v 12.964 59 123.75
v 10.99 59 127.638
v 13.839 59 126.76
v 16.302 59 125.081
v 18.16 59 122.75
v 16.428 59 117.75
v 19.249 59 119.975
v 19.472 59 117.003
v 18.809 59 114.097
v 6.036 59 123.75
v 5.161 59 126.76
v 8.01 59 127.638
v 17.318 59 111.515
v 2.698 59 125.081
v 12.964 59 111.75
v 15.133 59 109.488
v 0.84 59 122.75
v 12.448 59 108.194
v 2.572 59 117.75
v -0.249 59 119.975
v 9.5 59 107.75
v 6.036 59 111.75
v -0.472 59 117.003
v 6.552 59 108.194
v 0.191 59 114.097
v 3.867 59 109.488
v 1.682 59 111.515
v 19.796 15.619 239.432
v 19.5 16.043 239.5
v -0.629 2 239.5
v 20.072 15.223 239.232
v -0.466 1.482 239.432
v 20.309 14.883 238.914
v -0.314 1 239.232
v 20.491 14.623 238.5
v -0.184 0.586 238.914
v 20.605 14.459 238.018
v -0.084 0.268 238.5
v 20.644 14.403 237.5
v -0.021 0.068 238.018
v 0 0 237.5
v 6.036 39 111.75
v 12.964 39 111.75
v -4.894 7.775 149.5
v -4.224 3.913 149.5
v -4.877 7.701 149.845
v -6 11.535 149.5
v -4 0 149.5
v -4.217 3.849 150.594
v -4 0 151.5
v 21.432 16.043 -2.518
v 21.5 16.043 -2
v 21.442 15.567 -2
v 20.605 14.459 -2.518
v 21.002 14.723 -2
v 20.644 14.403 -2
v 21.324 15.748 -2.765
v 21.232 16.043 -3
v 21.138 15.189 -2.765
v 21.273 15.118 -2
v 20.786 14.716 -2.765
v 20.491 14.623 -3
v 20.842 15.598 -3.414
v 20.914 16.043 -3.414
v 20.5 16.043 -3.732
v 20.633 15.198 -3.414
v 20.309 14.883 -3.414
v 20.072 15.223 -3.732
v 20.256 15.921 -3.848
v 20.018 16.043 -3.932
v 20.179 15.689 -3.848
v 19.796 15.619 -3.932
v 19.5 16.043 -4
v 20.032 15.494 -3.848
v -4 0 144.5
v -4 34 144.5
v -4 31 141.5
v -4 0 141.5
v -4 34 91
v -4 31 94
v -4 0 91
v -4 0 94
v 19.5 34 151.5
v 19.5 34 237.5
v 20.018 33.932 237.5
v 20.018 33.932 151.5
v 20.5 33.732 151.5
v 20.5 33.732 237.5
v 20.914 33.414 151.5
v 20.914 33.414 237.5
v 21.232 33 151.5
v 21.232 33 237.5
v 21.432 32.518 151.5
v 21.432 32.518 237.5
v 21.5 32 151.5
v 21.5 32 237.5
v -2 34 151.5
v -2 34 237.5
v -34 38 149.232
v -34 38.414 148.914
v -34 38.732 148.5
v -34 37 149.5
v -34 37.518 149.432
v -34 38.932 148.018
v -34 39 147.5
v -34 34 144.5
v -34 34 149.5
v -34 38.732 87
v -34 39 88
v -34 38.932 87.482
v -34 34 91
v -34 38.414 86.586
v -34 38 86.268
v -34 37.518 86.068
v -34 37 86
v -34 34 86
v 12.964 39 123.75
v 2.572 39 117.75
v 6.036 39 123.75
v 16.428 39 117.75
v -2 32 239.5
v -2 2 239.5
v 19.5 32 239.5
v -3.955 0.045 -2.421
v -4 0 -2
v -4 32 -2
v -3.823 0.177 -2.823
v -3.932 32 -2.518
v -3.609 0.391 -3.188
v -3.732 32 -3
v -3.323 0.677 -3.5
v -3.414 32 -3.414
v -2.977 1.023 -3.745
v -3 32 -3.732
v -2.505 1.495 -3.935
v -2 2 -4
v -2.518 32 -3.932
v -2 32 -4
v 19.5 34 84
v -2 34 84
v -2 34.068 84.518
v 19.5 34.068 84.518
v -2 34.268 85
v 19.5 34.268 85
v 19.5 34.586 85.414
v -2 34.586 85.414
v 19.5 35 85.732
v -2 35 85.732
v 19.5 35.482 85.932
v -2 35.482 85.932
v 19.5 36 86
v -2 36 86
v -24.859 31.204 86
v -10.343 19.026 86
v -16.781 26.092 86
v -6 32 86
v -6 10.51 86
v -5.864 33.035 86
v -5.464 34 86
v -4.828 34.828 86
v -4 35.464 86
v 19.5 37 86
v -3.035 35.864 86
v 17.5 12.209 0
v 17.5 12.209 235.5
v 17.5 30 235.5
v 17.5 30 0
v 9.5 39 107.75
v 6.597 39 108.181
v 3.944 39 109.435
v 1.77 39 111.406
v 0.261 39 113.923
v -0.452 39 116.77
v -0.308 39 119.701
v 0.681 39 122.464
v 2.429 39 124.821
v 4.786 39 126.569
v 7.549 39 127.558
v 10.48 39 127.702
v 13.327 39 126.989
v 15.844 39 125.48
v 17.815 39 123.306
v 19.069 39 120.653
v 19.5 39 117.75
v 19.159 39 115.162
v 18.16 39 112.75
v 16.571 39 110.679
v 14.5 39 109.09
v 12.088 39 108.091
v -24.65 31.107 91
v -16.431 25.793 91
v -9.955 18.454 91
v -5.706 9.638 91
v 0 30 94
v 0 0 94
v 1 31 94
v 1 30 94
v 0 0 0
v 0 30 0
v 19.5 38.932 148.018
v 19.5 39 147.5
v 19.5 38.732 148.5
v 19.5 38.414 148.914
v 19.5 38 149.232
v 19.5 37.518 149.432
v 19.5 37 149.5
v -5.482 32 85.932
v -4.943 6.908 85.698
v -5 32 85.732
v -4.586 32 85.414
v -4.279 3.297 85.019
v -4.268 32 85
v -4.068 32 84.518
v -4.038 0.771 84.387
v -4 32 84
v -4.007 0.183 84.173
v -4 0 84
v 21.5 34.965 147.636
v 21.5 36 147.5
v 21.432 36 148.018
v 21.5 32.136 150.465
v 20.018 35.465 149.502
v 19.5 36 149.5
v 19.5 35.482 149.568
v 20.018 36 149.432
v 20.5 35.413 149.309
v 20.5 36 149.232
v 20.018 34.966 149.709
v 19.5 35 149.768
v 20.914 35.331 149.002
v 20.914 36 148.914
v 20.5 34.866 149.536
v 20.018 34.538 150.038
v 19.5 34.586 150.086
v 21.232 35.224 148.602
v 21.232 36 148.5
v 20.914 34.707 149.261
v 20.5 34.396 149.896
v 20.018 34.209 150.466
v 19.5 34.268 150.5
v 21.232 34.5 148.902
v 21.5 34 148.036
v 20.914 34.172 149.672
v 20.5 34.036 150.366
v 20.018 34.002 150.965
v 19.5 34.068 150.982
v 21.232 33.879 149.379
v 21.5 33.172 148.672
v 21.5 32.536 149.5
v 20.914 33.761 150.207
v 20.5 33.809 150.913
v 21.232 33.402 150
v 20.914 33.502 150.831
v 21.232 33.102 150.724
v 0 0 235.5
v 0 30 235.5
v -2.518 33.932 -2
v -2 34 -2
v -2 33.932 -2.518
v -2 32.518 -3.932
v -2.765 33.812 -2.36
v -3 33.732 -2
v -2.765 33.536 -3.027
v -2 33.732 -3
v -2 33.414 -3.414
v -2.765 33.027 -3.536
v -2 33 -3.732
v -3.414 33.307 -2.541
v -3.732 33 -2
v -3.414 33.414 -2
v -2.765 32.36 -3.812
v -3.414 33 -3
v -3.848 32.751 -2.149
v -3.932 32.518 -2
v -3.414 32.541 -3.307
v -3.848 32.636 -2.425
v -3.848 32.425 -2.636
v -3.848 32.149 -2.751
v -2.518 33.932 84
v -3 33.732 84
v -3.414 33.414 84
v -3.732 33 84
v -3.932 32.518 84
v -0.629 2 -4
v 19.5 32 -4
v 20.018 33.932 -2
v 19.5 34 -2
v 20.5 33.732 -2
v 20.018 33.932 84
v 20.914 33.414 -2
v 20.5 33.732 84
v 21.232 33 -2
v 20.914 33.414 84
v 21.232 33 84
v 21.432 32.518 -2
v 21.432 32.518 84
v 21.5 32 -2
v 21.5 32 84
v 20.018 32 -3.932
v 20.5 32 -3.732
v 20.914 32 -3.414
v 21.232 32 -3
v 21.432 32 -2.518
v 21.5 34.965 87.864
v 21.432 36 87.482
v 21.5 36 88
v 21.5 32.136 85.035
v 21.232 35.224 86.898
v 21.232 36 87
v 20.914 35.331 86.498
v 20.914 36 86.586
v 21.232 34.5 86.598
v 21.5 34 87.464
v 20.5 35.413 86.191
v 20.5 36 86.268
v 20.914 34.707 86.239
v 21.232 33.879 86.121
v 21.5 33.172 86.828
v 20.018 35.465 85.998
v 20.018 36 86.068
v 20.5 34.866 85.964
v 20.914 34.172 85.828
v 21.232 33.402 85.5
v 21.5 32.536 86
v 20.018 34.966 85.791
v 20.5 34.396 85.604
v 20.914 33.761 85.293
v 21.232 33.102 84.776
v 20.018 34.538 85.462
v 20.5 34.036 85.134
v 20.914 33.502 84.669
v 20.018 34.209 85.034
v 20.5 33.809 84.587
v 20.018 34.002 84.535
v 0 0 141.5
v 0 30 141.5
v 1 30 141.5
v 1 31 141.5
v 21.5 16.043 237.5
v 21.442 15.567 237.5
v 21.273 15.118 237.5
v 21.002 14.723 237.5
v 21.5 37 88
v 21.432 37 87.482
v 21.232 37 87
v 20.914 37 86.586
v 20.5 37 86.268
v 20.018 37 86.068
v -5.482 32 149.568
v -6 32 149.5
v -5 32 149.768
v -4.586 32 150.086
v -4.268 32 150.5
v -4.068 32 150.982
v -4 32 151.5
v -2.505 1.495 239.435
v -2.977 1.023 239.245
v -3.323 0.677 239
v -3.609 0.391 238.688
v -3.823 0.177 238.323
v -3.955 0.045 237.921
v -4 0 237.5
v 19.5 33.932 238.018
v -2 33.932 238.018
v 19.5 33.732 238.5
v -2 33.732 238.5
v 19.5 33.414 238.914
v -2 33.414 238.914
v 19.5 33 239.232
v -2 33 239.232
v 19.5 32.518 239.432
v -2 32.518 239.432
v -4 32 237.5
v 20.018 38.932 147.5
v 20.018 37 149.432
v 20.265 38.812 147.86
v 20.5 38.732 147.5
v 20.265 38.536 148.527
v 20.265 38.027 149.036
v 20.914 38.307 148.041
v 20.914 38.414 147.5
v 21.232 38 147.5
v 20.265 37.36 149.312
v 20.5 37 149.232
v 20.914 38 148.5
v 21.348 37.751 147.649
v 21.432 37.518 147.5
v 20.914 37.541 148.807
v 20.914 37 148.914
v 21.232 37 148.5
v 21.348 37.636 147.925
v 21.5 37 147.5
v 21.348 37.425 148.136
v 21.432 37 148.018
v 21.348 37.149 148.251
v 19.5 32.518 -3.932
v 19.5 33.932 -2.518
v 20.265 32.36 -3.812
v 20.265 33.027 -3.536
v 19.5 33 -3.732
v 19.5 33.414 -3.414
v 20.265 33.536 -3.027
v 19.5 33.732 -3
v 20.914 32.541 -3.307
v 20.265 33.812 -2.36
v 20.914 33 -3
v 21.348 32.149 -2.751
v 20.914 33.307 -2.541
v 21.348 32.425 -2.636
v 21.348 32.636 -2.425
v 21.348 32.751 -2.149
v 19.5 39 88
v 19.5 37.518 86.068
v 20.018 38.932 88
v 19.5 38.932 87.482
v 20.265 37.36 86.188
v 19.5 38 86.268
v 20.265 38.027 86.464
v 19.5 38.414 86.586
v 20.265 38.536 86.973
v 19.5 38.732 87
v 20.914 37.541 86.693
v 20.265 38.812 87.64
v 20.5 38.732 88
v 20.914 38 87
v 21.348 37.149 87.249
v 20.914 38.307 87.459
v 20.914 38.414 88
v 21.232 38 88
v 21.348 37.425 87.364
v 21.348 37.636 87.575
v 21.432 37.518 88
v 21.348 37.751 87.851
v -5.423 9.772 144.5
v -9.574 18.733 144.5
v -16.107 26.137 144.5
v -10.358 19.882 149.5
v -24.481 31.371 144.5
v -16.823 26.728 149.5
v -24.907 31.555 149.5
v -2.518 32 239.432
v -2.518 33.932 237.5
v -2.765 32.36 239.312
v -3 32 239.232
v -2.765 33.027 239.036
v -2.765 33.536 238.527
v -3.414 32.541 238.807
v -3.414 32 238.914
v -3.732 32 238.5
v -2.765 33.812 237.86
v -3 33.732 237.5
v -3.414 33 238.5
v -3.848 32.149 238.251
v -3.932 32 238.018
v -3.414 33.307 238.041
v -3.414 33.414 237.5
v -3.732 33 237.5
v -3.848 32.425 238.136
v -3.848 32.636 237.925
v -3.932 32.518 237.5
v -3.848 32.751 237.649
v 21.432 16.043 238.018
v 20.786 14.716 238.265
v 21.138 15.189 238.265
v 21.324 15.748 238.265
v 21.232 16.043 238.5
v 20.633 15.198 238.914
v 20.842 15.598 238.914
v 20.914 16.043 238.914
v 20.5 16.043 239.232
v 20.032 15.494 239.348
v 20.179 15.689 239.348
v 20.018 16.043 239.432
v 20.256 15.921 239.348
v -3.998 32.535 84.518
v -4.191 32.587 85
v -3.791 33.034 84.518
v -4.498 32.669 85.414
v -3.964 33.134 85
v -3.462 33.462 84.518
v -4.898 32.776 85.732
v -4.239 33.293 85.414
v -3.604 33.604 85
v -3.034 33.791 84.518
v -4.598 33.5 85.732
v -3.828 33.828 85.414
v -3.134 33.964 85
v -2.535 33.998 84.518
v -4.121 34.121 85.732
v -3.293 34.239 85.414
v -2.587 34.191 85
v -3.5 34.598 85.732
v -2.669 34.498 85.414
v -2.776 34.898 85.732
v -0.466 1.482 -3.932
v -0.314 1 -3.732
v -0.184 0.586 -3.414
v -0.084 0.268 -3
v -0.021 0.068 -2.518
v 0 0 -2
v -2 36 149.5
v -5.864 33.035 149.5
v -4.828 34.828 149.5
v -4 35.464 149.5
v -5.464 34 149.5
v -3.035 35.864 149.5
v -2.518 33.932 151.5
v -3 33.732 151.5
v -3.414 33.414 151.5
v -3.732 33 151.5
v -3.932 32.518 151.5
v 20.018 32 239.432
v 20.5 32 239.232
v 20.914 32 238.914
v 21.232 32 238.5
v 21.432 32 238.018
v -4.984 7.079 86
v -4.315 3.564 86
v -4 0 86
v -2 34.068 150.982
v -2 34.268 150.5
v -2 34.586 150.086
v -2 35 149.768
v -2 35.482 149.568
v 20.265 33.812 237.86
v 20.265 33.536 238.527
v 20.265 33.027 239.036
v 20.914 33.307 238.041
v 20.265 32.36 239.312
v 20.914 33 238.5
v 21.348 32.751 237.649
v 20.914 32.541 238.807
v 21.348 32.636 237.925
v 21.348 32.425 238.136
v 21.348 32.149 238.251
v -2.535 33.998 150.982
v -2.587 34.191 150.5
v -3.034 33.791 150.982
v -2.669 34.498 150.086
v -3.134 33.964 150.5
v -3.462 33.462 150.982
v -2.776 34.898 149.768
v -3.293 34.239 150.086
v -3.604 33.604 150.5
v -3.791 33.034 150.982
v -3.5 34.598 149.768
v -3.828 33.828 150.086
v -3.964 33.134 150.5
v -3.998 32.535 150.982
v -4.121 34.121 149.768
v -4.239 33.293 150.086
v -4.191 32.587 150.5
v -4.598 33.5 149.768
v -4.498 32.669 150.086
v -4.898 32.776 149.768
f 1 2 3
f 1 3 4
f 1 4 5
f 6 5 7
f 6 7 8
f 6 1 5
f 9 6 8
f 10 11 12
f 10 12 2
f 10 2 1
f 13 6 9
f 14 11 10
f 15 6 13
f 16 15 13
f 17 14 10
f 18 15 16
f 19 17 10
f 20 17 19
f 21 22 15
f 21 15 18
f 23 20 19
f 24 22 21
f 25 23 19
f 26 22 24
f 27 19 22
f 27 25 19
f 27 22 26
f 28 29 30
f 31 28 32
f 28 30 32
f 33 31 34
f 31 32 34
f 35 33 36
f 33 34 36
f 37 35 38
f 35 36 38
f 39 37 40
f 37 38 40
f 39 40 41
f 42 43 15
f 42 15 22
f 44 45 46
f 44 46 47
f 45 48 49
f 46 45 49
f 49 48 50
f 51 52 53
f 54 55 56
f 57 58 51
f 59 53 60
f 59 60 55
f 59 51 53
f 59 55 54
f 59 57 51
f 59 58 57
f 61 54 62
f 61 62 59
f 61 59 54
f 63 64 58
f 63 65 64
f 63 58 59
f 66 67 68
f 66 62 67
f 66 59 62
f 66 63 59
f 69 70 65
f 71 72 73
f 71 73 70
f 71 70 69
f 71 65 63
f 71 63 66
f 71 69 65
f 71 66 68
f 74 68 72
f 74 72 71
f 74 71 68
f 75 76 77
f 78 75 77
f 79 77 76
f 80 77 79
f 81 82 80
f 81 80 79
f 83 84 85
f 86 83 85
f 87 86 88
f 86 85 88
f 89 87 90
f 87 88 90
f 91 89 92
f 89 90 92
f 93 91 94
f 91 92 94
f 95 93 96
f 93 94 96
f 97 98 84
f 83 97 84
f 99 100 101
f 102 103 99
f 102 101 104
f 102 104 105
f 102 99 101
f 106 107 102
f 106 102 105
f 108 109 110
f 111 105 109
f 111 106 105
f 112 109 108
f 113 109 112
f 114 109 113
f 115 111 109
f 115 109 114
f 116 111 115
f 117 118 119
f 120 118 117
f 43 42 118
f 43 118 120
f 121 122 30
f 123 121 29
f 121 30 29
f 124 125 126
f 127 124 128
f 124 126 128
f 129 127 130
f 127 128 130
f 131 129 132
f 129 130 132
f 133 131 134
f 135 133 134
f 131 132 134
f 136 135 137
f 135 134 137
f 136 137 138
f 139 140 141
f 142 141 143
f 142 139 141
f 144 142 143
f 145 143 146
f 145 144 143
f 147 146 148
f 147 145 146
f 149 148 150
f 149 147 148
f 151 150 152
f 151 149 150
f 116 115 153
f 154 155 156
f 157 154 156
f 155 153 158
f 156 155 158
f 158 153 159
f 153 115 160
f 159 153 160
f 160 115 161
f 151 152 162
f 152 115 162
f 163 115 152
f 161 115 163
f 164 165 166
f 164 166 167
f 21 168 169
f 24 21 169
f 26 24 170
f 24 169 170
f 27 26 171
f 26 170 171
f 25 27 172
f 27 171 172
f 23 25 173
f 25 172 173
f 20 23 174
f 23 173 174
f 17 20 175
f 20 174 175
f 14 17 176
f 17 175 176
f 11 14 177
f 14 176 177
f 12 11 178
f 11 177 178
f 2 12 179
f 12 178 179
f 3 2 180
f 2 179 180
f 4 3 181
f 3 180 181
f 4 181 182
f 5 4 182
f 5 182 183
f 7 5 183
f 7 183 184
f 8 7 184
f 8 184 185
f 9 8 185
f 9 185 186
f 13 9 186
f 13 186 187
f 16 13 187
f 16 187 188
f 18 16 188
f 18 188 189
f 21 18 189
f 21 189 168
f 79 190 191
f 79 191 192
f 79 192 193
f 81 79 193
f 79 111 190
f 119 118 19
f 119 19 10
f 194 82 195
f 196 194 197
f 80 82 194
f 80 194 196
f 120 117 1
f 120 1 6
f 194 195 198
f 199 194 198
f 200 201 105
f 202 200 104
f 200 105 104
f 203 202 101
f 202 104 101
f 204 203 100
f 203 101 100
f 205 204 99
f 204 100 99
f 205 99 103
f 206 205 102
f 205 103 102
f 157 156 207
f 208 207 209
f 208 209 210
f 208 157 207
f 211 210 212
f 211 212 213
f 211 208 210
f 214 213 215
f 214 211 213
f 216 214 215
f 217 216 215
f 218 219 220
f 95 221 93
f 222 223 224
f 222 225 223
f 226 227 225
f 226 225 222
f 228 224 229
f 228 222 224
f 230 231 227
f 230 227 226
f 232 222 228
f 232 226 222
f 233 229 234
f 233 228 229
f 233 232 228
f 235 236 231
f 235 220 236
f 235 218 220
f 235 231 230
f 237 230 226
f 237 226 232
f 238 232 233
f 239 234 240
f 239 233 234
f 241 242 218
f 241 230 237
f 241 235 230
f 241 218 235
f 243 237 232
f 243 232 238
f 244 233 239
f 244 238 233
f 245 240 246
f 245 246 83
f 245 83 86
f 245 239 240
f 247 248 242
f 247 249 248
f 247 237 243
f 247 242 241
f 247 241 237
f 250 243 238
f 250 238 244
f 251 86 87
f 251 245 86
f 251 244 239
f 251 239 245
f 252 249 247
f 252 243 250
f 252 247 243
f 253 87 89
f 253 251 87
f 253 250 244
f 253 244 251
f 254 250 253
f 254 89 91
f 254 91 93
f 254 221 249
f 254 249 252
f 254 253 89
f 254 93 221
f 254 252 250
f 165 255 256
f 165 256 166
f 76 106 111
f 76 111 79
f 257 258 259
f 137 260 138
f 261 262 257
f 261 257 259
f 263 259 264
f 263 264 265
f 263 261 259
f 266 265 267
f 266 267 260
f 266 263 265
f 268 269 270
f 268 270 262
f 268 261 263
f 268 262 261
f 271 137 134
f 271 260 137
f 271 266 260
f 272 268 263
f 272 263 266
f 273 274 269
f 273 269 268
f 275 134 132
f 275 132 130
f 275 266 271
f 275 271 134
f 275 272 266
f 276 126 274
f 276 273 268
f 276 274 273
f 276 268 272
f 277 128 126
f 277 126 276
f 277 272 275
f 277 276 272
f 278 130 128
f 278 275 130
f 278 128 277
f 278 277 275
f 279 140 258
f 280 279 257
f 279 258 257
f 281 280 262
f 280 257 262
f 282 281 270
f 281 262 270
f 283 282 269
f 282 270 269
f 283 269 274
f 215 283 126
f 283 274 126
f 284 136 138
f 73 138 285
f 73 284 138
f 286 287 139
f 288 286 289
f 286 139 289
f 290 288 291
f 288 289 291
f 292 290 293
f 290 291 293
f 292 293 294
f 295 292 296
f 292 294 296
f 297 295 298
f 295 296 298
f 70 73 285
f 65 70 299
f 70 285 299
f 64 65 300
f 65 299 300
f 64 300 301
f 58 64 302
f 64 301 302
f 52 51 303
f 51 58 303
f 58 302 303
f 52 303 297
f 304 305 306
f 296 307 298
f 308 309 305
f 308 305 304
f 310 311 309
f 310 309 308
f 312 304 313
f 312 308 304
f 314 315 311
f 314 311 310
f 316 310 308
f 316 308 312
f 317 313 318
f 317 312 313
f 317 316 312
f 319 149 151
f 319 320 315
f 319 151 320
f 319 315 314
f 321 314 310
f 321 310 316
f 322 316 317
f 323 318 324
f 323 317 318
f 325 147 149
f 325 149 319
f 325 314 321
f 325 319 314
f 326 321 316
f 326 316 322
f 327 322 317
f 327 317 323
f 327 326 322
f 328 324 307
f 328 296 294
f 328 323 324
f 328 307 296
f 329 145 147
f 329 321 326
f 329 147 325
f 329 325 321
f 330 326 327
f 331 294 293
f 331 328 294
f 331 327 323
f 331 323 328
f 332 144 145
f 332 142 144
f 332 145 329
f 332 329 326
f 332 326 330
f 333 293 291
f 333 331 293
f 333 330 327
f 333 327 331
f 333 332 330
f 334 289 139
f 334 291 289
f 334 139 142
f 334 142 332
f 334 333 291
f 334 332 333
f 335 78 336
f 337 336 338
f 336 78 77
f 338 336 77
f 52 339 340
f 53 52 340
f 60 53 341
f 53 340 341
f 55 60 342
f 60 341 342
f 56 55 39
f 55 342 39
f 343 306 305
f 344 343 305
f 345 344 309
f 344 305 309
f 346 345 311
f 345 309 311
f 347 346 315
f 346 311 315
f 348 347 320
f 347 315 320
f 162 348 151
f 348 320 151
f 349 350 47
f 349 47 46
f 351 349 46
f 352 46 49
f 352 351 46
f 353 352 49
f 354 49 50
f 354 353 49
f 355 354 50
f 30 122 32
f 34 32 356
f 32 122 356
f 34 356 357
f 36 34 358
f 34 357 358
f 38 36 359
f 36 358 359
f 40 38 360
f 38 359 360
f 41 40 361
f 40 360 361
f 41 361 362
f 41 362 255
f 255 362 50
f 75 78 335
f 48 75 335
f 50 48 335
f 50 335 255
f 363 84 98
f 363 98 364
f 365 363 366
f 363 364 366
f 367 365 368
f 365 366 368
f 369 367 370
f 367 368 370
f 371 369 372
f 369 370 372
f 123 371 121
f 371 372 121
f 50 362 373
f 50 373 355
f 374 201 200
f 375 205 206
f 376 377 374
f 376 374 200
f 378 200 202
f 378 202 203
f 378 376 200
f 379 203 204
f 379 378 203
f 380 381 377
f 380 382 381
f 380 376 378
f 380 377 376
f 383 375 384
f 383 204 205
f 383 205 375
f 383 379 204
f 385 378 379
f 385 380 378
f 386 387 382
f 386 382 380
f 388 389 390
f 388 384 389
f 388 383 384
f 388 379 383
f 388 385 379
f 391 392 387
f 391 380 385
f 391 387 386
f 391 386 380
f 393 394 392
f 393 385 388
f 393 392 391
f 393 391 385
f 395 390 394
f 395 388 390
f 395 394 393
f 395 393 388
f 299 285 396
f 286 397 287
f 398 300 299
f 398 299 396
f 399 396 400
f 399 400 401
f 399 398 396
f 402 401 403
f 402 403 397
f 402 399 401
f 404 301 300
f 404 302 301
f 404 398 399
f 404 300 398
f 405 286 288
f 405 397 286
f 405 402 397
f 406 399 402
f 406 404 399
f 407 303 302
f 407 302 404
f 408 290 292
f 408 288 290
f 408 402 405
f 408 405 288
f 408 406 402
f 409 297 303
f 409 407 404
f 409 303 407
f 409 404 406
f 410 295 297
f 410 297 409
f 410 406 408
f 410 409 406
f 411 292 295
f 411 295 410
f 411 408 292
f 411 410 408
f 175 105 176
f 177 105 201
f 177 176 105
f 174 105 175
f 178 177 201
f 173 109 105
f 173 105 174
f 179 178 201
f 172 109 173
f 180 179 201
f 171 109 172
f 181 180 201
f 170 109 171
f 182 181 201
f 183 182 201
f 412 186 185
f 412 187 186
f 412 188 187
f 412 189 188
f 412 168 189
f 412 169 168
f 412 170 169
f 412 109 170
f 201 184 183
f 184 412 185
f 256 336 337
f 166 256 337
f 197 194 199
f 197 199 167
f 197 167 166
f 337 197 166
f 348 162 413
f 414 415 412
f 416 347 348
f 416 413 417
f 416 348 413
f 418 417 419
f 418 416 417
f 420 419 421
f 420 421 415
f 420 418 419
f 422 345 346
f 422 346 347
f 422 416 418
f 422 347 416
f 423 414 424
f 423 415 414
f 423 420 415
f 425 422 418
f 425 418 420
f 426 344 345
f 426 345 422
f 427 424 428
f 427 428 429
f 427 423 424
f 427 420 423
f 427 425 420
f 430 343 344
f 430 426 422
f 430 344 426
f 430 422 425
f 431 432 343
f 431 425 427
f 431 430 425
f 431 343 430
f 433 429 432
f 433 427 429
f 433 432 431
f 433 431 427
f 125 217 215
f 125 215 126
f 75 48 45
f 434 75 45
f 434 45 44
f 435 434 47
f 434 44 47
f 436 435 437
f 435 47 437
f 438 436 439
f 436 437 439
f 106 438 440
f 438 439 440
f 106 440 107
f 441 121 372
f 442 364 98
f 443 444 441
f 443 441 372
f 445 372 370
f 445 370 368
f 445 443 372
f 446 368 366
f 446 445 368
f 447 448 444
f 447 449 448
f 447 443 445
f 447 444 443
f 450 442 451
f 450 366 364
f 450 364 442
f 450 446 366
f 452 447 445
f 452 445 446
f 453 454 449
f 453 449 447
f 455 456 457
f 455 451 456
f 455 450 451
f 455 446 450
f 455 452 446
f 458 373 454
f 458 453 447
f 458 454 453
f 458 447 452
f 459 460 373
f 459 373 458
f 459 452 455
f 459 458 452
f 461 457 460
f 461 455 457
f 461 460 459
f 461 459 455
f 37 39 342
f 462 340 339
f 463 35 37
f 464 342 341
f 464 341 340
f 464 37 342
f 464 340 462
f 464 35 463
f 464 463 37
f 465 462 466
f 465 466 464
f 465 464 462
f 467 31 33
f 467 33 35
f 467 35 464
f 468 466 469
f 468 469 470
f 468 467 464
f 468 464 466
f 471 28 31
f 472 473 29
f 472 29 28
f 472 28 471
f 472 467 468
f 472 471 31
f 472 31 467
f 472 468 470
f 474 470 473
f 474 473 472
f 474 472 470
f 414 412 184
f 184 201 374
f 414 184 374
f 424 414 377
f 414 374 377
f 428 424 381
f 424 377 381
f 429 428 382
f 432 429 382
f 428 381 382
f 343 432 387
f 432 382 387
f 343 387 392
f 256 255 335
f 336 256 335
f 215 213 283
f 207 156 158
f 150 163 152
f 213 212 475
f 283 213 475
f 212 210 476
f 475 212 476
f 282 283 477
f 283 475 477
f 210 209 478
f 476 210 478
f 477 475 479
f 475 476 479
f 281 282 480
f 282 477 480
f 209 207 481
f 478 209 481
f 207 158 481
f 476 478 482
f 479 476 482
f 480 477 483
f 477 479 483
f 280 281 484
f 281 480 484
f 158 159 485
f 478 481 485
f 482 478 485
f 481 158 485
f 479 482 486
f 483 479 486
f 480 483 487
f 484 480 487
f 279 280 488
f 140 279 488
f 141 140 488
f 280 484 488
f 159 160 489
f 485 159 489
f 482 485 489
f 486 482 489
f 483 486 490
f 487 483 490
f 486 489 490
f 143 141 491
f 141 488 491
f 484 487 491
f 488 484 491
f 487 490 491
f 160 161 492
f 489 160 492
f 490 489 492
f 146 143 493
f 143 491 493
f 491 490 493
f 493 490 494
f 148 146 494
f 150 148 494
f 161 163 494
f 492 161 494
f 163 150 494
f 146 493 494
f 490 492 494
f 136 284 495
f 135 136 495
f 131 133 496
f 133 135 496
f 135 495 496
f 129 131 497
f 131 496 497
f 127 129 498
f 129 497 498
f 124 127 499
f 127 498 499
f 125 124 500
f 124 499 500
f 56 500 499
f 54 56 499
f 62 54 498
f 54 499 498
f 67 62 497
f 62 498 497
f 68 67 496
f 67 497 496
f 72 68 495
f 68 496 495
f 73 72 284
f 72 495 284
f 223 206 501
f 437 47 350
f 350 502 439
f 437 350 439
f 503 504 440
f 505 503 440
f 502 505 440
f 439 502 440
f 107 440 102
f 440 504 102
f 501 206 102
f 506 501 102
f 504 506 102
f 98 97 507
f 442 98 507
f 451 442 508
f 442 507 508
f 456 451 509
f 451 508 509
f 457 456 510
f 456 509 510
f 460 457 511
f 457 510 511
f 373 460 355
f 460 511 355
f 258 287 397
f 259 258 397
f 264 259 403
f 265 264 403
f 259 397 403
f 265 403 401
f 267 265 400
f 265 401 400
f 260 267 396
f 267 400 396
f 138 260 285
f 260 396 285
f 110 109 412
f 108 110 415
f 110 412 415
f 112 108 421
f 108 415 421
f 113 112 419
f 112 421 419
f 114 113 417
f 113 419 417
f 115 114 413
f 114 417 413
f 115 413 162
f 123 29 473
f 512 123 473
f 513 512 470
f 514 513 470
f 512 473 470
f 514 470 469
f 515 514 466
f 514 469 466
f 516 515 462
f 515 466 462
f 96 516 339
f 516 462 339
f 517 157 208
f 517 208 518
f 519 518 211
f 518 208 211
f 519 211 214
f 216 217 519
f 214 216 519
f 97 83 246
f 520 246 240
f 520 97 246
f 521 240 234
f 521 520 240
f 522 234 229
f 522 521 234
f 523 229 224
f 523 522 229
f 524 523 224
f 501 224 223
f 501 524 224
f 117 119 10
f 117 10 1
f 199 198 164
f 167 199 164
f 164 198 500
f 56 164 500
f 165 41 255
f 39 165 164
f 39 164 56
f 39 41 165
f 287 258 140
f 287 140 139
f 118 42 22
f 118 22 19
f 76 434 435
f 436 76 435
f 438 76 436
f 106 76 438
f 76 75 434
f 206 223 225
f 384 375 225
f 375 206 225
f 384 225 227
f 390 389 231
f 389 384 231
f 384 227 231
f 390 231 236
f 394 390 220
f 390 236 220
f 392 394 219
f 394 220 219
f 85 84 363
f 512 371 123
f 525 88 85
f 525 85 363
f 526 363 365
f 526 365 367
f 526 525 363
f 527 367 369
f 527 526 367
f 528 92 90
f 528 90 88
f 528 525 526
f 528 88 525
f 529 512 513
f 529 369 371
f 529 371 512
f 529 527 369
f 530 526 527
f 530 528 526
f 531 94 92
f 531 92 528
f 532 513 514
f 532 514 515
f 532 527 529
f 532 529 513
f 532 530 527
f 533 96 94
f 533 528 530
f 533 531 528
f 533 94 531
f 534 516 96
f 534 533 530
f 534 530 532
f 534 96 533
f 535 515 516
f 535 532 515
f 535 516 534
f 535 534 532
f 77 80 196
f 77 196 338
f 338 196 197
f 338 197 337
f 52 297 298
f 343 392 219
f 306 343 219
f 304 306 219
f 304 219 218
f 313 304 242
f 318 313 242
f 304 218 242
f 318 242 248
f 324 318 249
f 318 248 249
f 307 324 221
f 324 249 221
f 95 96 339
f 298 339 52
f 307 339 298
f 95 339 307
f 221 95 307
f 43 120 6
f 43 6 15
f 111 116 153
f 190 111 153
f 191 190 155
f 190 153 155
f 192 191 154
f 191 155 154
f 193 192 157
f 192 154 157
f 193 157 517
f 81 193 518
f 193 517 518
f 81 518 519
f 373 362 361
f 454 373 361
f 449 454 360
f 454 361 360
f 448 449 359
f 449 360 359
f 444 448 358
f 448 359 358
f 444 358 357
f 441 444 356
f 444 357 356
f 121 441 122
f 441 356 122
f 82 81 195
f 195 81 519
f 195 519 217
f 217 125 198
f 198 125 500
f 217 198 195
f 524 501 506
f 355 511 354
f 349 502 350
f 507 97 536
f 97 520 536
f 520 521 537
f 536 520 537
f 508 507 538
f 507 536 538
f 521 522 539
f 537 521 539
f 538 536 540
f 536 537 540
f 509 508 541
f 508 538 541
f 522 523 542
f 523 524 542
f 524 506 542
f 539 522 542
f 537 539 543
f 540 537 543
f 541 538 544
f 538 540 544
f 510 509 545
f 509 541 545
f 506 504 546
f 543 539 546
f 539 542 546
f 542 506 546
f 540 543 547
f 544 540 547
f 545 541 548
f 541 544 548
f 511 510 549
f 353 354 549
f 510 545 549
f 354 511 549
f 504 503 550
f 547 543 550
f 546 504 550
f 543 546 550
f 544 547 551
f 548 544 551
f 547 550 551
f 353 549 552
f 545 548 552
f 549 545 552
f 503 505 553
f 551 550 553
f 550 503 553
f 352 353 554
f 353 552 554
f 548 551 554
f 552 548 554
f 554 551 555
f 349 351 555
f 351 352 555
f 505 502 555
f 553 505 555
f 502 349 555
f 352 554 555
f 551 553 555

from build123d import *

# Parameters (mm, degrees)
SKETCH1_W                         = 25.5
SKETCH1_H                         = 243.5
SKETCH1_W_2                       = 17.5
SKETCH1_H_2                       = 235.5
MOTOR_PANEL_CONNECTOR_DEPTH       = 34
SKETCH3_W                         = 25.5
SKETCH3_H                         = 243.5
MOTOR_PANEL_CONNECCTOR_BASE_DEPTH = 4
UP_DOWN_CONNECT_CUT_DEPTH         = 250
SKETCH5_W                         = 47.5
SKETCH5_H                         = 31
CUT_TO_NAIL_PART_DEPTH            = 5
SKETCH6_W                         = 55.5
SKETCH6_H                         = 63.5
PANEL_CONNECTOR_DEPTH             = 5
SKETCH7_R                         = 10
BOSS_EXTRUDE4_DEPTH               = 20
BOSS_EXTRUDE5_DEPTH               = 5
BOSS_EXTRUDE6_DEPTH               = 5
FILLET1_R                         = 2


with BuildPart() as part:
    # Sketch1 → motor -panel connector (new body)
    with BuildSketch(Plane(origin=(0, 0, 0), x_dir=(1, 0, 0), z_dir=(0, 1, 0))):
        with Locations((8.75, -117.75)):
            Rectangle(SKETCH1_W, SKETCH1_H)
        with Locations((8.75, -117.75)):
            Rectangle(SKETCH1_W_2, SKETCH1_H_2, mode=Mode.SUBTRACT)
    extrude(amount=MOTOR_PANEL_CONNECTOR_DEPTH)

    # Sketch3 → motor-panel connecctor base (add)
    with BuildSketch(Plane(origin=(0, 34, 0), x_dir=(1, 0, 0), z_dir=(0, 1, 0))):
        with Locations((8.75, -117.75)):
            Rectangle(SKETCH3_W, SKETCH3_H)
    extrude(amount=-MOTOR_PANEL_CONNECCTOR_BASE_DEPTH)

    # Sketch4 → up down connect cut (cut)
    with BuildSketch(Plane.XY.offset(239.5)):
        Polygon((0, 0), (21.5, 15), (21.5, 0), align=None)
    extrude(amount=-UP_DOWN_CONNECT_CUT_DEPTH, mode=Mode.SUBTRACT)

    # Sketch5 → cut to nail part (cut)
    with BuildSketch(Plane.ZY.offset(4)):
        with Locations((117.75, 15.5)):
            Rectangle(SKETCH5_W, SKETCH5_H)
    extrude(amount=-CUT_TO_NAIL_PART_DEPTH, mode=Mode.SUBTRACT)

    # Sketch6 → panel connector (add)
    with BuildSketch(Plane(origin=(0, 34, 0), x_dir=(1, 0, 0), z_dir=(0, 1, 0))):
        with Locations((-6.25, -117.75)):
            Rectangle(SKETCH6_W, SKETCH6_H)
    extrude(amount=PANEL_CONNECTOR_DEPTH)

    # Sketch7 → Boss-Extrude4 (add)
    with BuildSketch(Plane(origin=(0, 39, 0), x_dir=(1, 0, 0), z_dir=(0, 1, 0))):
        with Locations(Location((9.5, -117.75, 0), (0, 0, 90))):
            Circle(SKETCH7_R)
        Polygon((12.964101615, -123.75), (16.42820323, -117.75), (12.964101615, -111.75), (6.035898385, -111.75), (2.57179677, -117.75), (6.035898385, -123.75), align=None, mode=Mode.SUBTRACT)
    extrude(amount=BOSS_EXTRUDE4_DEPTH)

    # Sketch8 → Boss-Extrude5 (add)
    with BuildSketch(Plane.XY.offset(149.5)):
        with BuildLine():
            Line((-34, 34), (-4, 34))
            Line((-4, 34), (-4, 0))
            ThreePointArc((-4, 0), (-12.572222823, 22.671568098), (-34, 34))
        make_face()
    extrude(amount=-BOSS_EXTRUDE5_DEPTH)

    # Sketch13 → Boss-Extrude6 (add)
    with BuildSketch(Plane(origin=(0, 0, 86), x_dir=(-1, 0, 0), z_dir=(0, 0, -1))):
        with BuildLine():
            Line((4, 0), (4, 34))
            Line((4, 34), (34, 34))
            ThreePointArc((34, 34), (12.941232514, 22.345971311), (4, 0))
        make_face()
    extrude(amount=-BOSS_EXTRUDE6_DEPTH)

    # Fillet1
    # the kernel refuses this fillet: 2 mm, written as the material it takes off along each edge
    with BuildSketch(Plane(origin=(-2, 32, 237.5), x_dir=(0, 1, 0), z_dir=(-1, 0, 0))) as fillet1_piece_1_section:
        Polygon((0, 0), (FILLET1_R * 1.02, 0), (FILLET1_R * 1.02, -FILLET1_R * 1.02), (0, -FILLET1_R * 1.02), align=None)
    fillet1_piece_1 = extrude(amount=FILLET1_R * 1.02, mode=Mode.PRIVATE)
    fillet1_piece_1 = fillet1_piece_1 - Plane(origin=(-2, 32, 237.5), x_dir=(0, -0.7071067811865475, -0.7071067811865475), z_dir=(-1, 0, 0)) * Sphere(FILLET1_R, mode=Mode.PRIVATE)
    add(fillet1_piece_1, mode=Mode.SUBTRACT)
    with BuildSketch(Plane(origin=(-2, 32, -2), x_dir=(0, 1, 0), z_dir=(-1, 0, 0))) as fillet1_piece_2_section:
        Polygon((0, 0), (FILLET1_R * 1.02, 0), (FILLET1_R * 1.02, FILLET1_R * 1.02), (0, FILLET1_R * 1.02), align=None)
    fillet1_piece_2 = extrude(amount=FILLET1_R * 1.02, mode=Mode.PRIVATE)
    fillet1_piece_2 = fillet1_piece_2 - Plane(origin=(-2, 32, -2), x_dir=(0, -0.7071067811865475, 0.7071067811865475), z_dir=(-1, 0, 0)) * Sphere(FILLET1_R, mode=Mode.PRIVATE)
    add(fillet1_piece_2, mode=Mode.SUBTRACT)
    with BuildSketch(Plane(origin=(19.5, 16.043297996, 237.5), x_dir=(0.5721815960240814, -0.8201269543011832, 0), z_dir=(0, 0, 1))) as fillet1_piece_3_section:
        Polygon((0, 0), (FILLET1_R * 1.02, 0), (FILLET1_R * 1.02, FILLET1_R * 0.532081978), (FILLET1_R * 0.583625227945, FILLET1_R * 0.836529493387), align=None)
    fillet1_piece_3 = extrude(amount=FILLET1_R * 1.02, mode=Mode.PRIVATE)
    fillet1_piece_3 = fillet1_piece_3 - Plane(origin=(19.5, 16.043297996, 237.5), x_dir=(-0.886617616569872, 0.4625031913273241, 0), z_dir=(0, 0, 1)) * Sphere(FILLET1_R, mode=Mode.PRIVATE)
    add(fillet1_piece_3, mode=Mode.SUBTRACT)
    with BuildSketch(Plane(origin=(19.5, 16.043297996, -2), x_dir=(0.5721815960240814, -0.8201269543011832, 0), z_dir=(0, 0, -1))) as fillet1_piece_4_section:
        Polygon((0, 0), (FILLET1_R * 1.02, 0), (FILLET1_R * 1.02, -FILLET1_R * 0.532081978), (FILLET1_R * 0.583625227945, -FILLET1_R * 0.836529493387), align=None)
    fillet1_piece_4 = extrude(amount=FILLET1_R * 1.02, mode=Mode.PRIVATE)
    fillet1_piece_4 = fillet1_piece_4 - Plane(origin=(19.5, 16.043297996, -2), x_dir=(-0.886617616569872, 0.4625031913273241, 0), z_dir=(0, 0, -1)) * Sphere(FILLET1_R, mode=Mode.PRIVATE)
    add(fillet1_piece_4, mode=Mode.SUBTRACT)
    with BuildSketch(Plane(origin=(21.5, 39, 154.5), x_dir=(0, -1, 0), z_dir=(0, 0, -1))) as fillet1_piece_5:
        with BuildLine():
            CenterArc((FILLET1_R, FILLET1_R), FILLET1_R, 180, 90)
            Line((0, FILLET1_R), (0, 0))
            Line((0, 0), (FILLET1_R, 0))
        make_face()
    extrude(amount=73.5, mode=Mode.SUBTRACT)
    with BuildSketch(Plane(origin=(26.5, 39, 86), x_dir=(0, -1, 0), z_dir=(-1, 0, 0))) as fillet1_piece_6:
        with BuildLine():
            CenterArc((FILLET1_R, FILLET1_R), FILLET1_R, 180, 90)
            Line((0, FILLET1_R), (0, 0))
            Line((0, 0), (FILLET1_R, 0))
        make_face()
    extrude(amount=65.5, mode=Mode.SUBTRACT)
    with BuildSketch(Plane(origin=(-39, 39, 149.5), x_dir=(0, 0, -1), z_dir=(1, 0, 0))) as fillet1_piece_7:
        with BuildLine():
            CenterArc((FILLET1_R, -FILLET1_R), FILLET1_R, 90, 90)
            Line((0, -FILLET1_R), (0, 0))
            Line((0, 0), (FILLET1_R, 0))
        make_face()
    extrude(amount=65.5, mode=Mode.SUBTRACT)
    with BuildSketch(Plane(origin=(-2, 34, 239.5), x_dir=(0, -1, 0), z_dir=(1, 0, 0))) as fillet1_piece_8:
        with BuildLine():
            CenterArc((FILLET1_R, FILLET1_R), FILLET1_R, 180, 90)
            Line((0, FILLET1_R), (0, 0))
            Line((0, 0), (FILLET1_R, 0))
        make_face()
    extrude(amount=28.5, mode=Mode.SUBTRACT)
    with BuildSketch(Plane(origin=(26.5, 34, -4), x_dir=(0, 0, 1), z_dir=(-1, 0, 0))) as fillet1_piece_9:
        with BuildLine():
            CenterArc((FILLET1_R, -FILLET1_R), FILLET1_R, 90, 90)
            Line((0, -FILLET1_R), (0, 0))
            Line((0, 0), (FILLET1_R, 0))
        make_face()
    extrude(amount=28.5, mode=Mode.SUBTRACT)
    with BuildSketch(Plane(origin=(21.5, 15, 237.5), x_dir=(-0.8201269543011818, -0.5721815960240832, 0), z_dir=(0, 0, -1))) as fillet1_piece_10:
        with BuildLine():
            CenterArc((FILLET1_R * 0.521648998039, FILLET1_R), FILLET1_R, 214.902495616, 55.097504384)
            Line((-FILLET1_R * 0.298477956262, FILLET1_R * 0.427818403976), (0, 0))
            Line((0, 0), (FILLET1_R * 0.521648998039, 0))
        make_face()
    extrude(amount=239.5, mode=Mode.SUBTRACT)
    with BuildSketch(Plane(origin=(-9, 0, 239.5), x_dir=(0, 1, 0), z_dir=(1, 0, 0))) as fillet1_piece_11:
        with BuildLine():
            CenterArc((FILLET1_R, -FILLET1_R), FILLET1_R, 90, 90)
            Line((0, -FILLET1_R), (0, 0))
            Line((0, 0), (FILLET1_R, 0))
        make_face()
    extrude(amount=14, mode=Mode.SUBTRACT)
    with BuildSketch(Plane(origin=(5, 0, -4), x_dir=(0, 0, 1), z_dir=(-1, 0, 0))) as fillet1_piece_12:
        with BuildLine():
            CenterArc((FILLET1_R, FILLET1_R), FILLET1_R, 180, 90)
            Line((0, FILLET1_R), (0, 0))
            Line((0, 0), (FILLET1_R, 0))
        make_face()
    extrude(amount=14, mode=Mode.SUBTRACT)
    with BuildSketch(Plane(origin=(-4.100634772, -2.86090798, -4), x_dir=(-0.5721815960240814, 0.8201269543011832, 0), z_dir=(0.8201269543011832, 0.5721815960240814, 0)), Plane(origin=(-4.100634772, -2.86090798, 239.5), x_dir=(0, 0, -1), z_dir=(0.8201269543011832, 0.5721815960240814, 0))) as fillet1_piece_13:
        with BuildLine():
            CenterArc((FILLET1_R, FILLET1_R), FILLET1_R, 180, 90)
            Line((0, FILLET1_R), (0, 0))
            Line((0, 0), (FILLET1_R, 0))
        make_face()
    extrude(amount=30.172155462, mode=Mode.SUBTRACT)
    with BuildSketch(Plane(origin=(21.5, 39, -4), x_dir=(-1, 0, 0), z_dir=(0, -1, 0))) as fillet1_piece_14:
        with BuildLine():
            CenterArc((FILLET1_R, -FILLET1_R), FILLET1_R, 90, 90)
            Line((0, -FILLET1_R), (0, 0))
            Line((0, 0), (FILLET1_R, 0))
        make_face()
    extrude(amount=22.956702004, mode=Mode.SUBTRACT)
    with BuildSketch(Plane(origin=(21.5, 16.043297996, 239.5), x_dir=(0, 0, -1), z_dir=(0, 1, 0))) as fillet1_piece_15:
        with BuildLine():
            CenterArc((FILLET1_R, FILLET1_R), FILLET1_R, 180, 90)
            Line((0, FILLET1_R), (0, 0))
            Line((0, 0), (FILLET1_R, 0))
        make_face()
    extrude(amount=22.956702004, mode=Mode.SUBTRACT)
    with BuildSketch(Plane(origin=(-4, -5, 239.5), x_dir=(1, 0, 0), z_dir=(0, 1, 0))) as fillet1_piece_16:
        with BuildLine():
            CenterArc((FILLET1_R, FILLET1_R), FILLET1_R, 180, 90)
            Line((0, FILLET1_R), (0, 0))
            Line((0, 0), (FILLET1_R, 0))
        make_face()
    extrude(amount=37, mode=Mode.SUBTRACT)
    with BuildSketch(Plane(origin=(-4, 32, -4), x_dir=(0, 0, 1), z_dir=(0, -1, 0))) as fillet1_piece_17:
        with BuildLine():
            CenterArc((FILLET1_R, -FILLET1_R), FILLET1_R, 90, 90)
            Line((0, -FILLET1_R), (0, 0))
            Line((0, 0), (FILLET1_R, 0))
        make_face()
    extrude(amount=37, mode=Mode.SUBTRACT)
    with BuildSketch(Plane(origin=(-4, 34, -2), x_dir=(0, -1, 0), z_dir=(0, 0, 1))) as fillet1_piece_18:
        with BuildLine():
            CenterArc((FILLET1_R, FILLET1_R), FILLET1_R, 180, 90)
            Line((0, FILLET1_R), (0, 0))
            Line((0, 0), (FILLET1_R, 0))
        make_face()
    extrude(amount=88, mode=Mode.SUBTRACT)
    with BuildSketch(Plane(origin=(-4, 34, 149.5), x_dir=(1, 0, 0), z_dir=(0, 0, 1))) as fillet1_piece_19:
        with BuildLine():
            CenterArc((FILLET1_R, -FILLET1_R), FILLET1_R, 90, 90)
            Line((0, -FILLET1_R), (0, 0))
            Line((0, 0), (FILLET1_R, 0))
        make_face()
    extrude(amount=88, mode=Mode.SUBTRACT)
    # the kernel refuses this fillet: 2 mm, written as the material it adds along each edge
    with BuildSketch(Plane(origin=(-4, 32, 149.5), x_dir=(-1, 0, 0), z_dir=(0, -1, 0))) as fillet1_2_piece_1_section:
        with BuildLine():
            CenterArc((FILLET1_R, -FILLET1_R), FILLET1_R, 90, 90)
            Line((0, -FILLET1_R), (0, 0))
            Line((0, 0), (FILLET1_R, 0))
        make_face()
    fillet1_2_piece_1 = extrude(amount=32, mode=Mode.PRIVATE)
    fillet1_2_piece_1 = fillet1_2_piece_1 - Plane(origin=(-38.266666667, 0, 149.967222139), x_dir=(1, 0, 0), z_dir=(0, 0, 1)) * Cylinder(34.266666667, 72, mode=Mode.PRIVATE)
    add(fillet1_2_piece_1)
    with BuildSketch(Plane(origin=(-4, 0, 86), x_dir=(0, 0, -1), z_dir=(0, 1, 0))) as fillet1_2_piece_2_section:
        with BuildLine():
            CenterArc((FILLET1_R, FILLET1_R), FILLET1_R, 180, 90)
            Line((0, FILLET1_R), (0, 0))
            Line((0, 0), (FILLET1_R, 0))
        make_face()
    fillet1_2_piece_2 = extrude(amount=32, mode=Mode.PRIVATE)
    fillet1_2_piece_2 = fillet1_2_piece_2 - Plane(origin=(-39.820351429, -1.370898319, 85.534344582), x_dir=(0.16236841120732118, 0.9867302058019762, 0), z_dir=(0, 0, -1)) * Cylinder(35.846574992, 73, mode=Mode.PRIVATE)
    add(fillet1_2_piece_2)
    with BuildSketch(Plane(origin=(-2, 34, 149.5), x_dir=(0, 1, 0), z_dir=(1, 0, 0)), Plane(origin=(21.5, 34, 86), x_dir=(0, 1, 0), z_dir=(-1, 0, 0))) as fillet1_2_piece_3:
        with BuildLine():
            CenterArc((FILLET1_R, FILLET1_R), FILLET1_R, 180, 90)
            Line((0, FILLET1_R), (0, 0))
            Line((0, 0), (FILLET1_R, 0))
        make_face()
    extrude(amount=23.5)
    with BuildSketch(Plane(origin=(-2, 32, 86), x_dir=(-1, 0, 0), z_dir=(0, -1, 0))) as fillet1_2_piece_4:
        with BuildLine():
            CenterArc((2 + FILLET1_R, FILLET1_R), FILLET1_R, 180, 90)
            Line((2, FILLET1_R), (2, 0))
            Line((2, 0), (2 + FILLET1_R, 0))
        make_face()
    revolve(axis=Axis((-2, 32, 86), (0, 0, -1)), revolution_arc=90)
    with BuildSketch(Plane(origin=(-2, 32, 149.5), x_dir=(0, 1, 0), z_dir=(1, 0, 0))) as fillet1_2_piece_5:
        with BuildLine():
            CenterArc((2 + FILLET1_R, FILLET1_R), FILLET1_R, 180, 90)
            Line((2, FILLET1_R), (2, 0))
            Line((2, 0), (2 + FILLET1_R, 0))
        make_face()
    revolve(axis=Axis((-2, 32, 149.5), (0, 0, 1)), revolution_arc=90)
    # the kernel refuses this fillet: 2 mm, written as the material it takes off along each edge
    with BuildSketch(Plane(origin=(19.5, 37, 88), x_dir=(0, 0, -1), z_dir=(1, 0, 0))) as fillet1_3_piece_1_section:
        Polygon((0, 0), (FILLET1_R * 1.02, 0), (FILLET1_R * 1.02, FILLET1_R * 1.02), (0, FILLET1_R * 1.02), align=None)
    fillet1_3_piece_1 = extrude(amount=FILLET1_R * 1.02, mode=Mode.PRIVATE)
    fillet1_3_piece_1 = fillet1_3_piece_1 - Plane(origin=(19.5, 37, 88), x_dir=(0, -0.7071067811865475, 0.7071067811865475), z_dir=(1, 0, 0)) * Sphere(FILLET1_R, mode=Mode.PRIVATE)
    add(fillet1_3_piece_1, mode=Mode.SUBTRACT)
    with BuildSketch(Plane(origin=(19.5, 37, 147.5), x_dir=(0, 0, 1), z_dir=(1, 0, 0))) as fillet1_3_piece_2_section:
        Polygon((0, 0), (FILLET1_R * 1.02, 0), (FILLET1_R * 1.02, -FILLET1_R * 1.02), (0, -FILLET1_R * 1.02), align=None)
    fillet1_3_piece_2 = extrude(amount=FILLET1_R * 1.02, mode=Mode.PRIVATE)
    fillet1_3_piece_2 = fillet1_3_piece_2 - Plane(origin=(19.5, 37, 147.5), x_dir=(0, -0.7071067811865475, -0.7071067811865475), z_dir=(1, 0, 0)) * Sphere(FILLET1_R, mode=Mode.PRIVATE)
    add(fillet1_3_piece_2, mode=Mode.SUBTRACT)
    with BuildSketch(Plane(origin=(19.5, 32, -2), x_dir=(0, 1, 0), z_dir=(1, 0, 0))) as fillet1_3_piece_3_section:
        Polygon((0, 0), (FILLET1_R * 1.02, 0), (FILLET1_R * 1.02, -FILLET1_R * 1.02), (0, -FILLET1_R * 1.02), align=None)
    fillet1_3_piece_3 = extrude(amount=FILLET1_R * 1.02, mode=Mode.PRIVATE)
    fillet1_3_piece_3 = fillet1_3_piece_3 - Plane(origin=(19.5, 32, -2), x_dir=(0, -0.7071067811865475, 0.7071067811865475), z_dir=(1, 0, 0)) * Sphere(FILLET1_R, mode=Mode.PRIVATE)
    add(fillet1_3_piece_3, mode=Mode.SUBTRACT)
    with BuildSketch(Plane(origin=(19.5, 32, 237.5), x_dir=(0, 1, 0), z_dir=(1, 0, 0))) as fillet1_3_piece_4_section:
        Polygon((0, 0), (FILLET1_R * 1.02, 0), (FILLET1_R * 1.02, FILLET1_R * 1.02), (0, FILLET1_R * 1.02), align=None)
    fillet1_3_piece_4 = extrude(amount=FILLET1_R * 1.02, mode=Mode.PRIVATE)
    fillet1_3_piece_4 = fillet1_3_piece_4 - Plane(origin=(19.5, 32, 237.5), x_dir=(0, -0.7071067811865475, -0.7071067811865475), z_dir=(1, 0, 0)) * Sphere(FILLET1_R, mode=Mode.PRIVATE)
    add(fillet1_3_piece_4, mode=Mode.SUBTRACT)
    with BuildSketch(Plane(origin=(21.5, 34, 237.5), x_dir=(0, -1, 0), z_dir=(0, 0, -1)), Plane(origin=(21.5, 34, 84), x_dir=(0, -1, 0), z_dir=(0, 0, -1))) as fillet1_3_piece_5:
        with BuildLine():
            CenterArc((FILLET1_R, FILLET1_R), FILLET1_R, 180, 90)
            Line((0, FILLET1_R), (0, 0))
            Line((0, 0), (FILLET1_R, 0))
        make_face()
    extrude(amount=86, mode=Mode.SUBTRACT)
    with BuildSketch(Plane(origin=(21.5, 36, 149.5), x_dir=(0, 0, -1), z_dir=(0, 1, 0))) as fillet1_3_piece_6:
        with BuildLine():
            CenterArc((FILLET1_R, FILLET1_R), FILLET1_R, 180, 90)
            Line((0, FILLET1_R), (0, 0))
            Line((0, 0), (FILLET1_R, 0))
        make_face()
    extrude(amount=1, mode=Mode.SUBTRACT)
    with BuildSketch(Plane(origin=(21.5, 36, 86), x_dir=(0, 0, 1), z_dir=(0, 1, 0))) as fillet1_3_piece_7:
        with BuildLine():
            CenterArc((FILLET1_R, -FILLET1_R), FILLET1_R, 90, 90)
            Line((0, -FILLET1_R), (0, 0))
            Line((0, 0), (FILLET1_R, 0))
        make_face()
    extrude(amount=1, mode=Mode.SUBTRACT)
    with BuildSketch(Plane(origin=(21.5, 36, 84), x_dir=(0, 0, 1), z_dir=(0, 1, 0))) as fillet1_3_piece_8:
        with BuildLine():
            CenterArc((2 + FILLET1_R, -FILLET1_R), FILLET1_R, 90, 90)
            Line((2, -FILLET1_R), (2, 0))
            Line((2, 0), (2 + FILLET1_R, 0))
        make_face()
    revolve(axis=Axis((21.5, 36, 84), (1, 0, 0)), revolution_arc=90, mode=Mode.SUBTRACT)
    with BuildSketch(Plane(origin=(21.5, 36, 151.5), x_dir=(0, 0, -1), z_dir=(0, 1, 0))) as fillet1_3_piece_9:
        with BuildLine():
            CenterArc((2 + FILLET1_R, FILLET1_R), FILLET1_R, 180, 90)
            Line((2, FILLET1_R), (2, 0))
            Line((2, 0), (2 + FILLET1_R, 0))
        make_face()
    revolve(axis=Axis((21.5, 36, 151.5), (-1, 0, 0)), revolution_arc=90, mode=Mode.SUBTRACT)


solid = part.part
